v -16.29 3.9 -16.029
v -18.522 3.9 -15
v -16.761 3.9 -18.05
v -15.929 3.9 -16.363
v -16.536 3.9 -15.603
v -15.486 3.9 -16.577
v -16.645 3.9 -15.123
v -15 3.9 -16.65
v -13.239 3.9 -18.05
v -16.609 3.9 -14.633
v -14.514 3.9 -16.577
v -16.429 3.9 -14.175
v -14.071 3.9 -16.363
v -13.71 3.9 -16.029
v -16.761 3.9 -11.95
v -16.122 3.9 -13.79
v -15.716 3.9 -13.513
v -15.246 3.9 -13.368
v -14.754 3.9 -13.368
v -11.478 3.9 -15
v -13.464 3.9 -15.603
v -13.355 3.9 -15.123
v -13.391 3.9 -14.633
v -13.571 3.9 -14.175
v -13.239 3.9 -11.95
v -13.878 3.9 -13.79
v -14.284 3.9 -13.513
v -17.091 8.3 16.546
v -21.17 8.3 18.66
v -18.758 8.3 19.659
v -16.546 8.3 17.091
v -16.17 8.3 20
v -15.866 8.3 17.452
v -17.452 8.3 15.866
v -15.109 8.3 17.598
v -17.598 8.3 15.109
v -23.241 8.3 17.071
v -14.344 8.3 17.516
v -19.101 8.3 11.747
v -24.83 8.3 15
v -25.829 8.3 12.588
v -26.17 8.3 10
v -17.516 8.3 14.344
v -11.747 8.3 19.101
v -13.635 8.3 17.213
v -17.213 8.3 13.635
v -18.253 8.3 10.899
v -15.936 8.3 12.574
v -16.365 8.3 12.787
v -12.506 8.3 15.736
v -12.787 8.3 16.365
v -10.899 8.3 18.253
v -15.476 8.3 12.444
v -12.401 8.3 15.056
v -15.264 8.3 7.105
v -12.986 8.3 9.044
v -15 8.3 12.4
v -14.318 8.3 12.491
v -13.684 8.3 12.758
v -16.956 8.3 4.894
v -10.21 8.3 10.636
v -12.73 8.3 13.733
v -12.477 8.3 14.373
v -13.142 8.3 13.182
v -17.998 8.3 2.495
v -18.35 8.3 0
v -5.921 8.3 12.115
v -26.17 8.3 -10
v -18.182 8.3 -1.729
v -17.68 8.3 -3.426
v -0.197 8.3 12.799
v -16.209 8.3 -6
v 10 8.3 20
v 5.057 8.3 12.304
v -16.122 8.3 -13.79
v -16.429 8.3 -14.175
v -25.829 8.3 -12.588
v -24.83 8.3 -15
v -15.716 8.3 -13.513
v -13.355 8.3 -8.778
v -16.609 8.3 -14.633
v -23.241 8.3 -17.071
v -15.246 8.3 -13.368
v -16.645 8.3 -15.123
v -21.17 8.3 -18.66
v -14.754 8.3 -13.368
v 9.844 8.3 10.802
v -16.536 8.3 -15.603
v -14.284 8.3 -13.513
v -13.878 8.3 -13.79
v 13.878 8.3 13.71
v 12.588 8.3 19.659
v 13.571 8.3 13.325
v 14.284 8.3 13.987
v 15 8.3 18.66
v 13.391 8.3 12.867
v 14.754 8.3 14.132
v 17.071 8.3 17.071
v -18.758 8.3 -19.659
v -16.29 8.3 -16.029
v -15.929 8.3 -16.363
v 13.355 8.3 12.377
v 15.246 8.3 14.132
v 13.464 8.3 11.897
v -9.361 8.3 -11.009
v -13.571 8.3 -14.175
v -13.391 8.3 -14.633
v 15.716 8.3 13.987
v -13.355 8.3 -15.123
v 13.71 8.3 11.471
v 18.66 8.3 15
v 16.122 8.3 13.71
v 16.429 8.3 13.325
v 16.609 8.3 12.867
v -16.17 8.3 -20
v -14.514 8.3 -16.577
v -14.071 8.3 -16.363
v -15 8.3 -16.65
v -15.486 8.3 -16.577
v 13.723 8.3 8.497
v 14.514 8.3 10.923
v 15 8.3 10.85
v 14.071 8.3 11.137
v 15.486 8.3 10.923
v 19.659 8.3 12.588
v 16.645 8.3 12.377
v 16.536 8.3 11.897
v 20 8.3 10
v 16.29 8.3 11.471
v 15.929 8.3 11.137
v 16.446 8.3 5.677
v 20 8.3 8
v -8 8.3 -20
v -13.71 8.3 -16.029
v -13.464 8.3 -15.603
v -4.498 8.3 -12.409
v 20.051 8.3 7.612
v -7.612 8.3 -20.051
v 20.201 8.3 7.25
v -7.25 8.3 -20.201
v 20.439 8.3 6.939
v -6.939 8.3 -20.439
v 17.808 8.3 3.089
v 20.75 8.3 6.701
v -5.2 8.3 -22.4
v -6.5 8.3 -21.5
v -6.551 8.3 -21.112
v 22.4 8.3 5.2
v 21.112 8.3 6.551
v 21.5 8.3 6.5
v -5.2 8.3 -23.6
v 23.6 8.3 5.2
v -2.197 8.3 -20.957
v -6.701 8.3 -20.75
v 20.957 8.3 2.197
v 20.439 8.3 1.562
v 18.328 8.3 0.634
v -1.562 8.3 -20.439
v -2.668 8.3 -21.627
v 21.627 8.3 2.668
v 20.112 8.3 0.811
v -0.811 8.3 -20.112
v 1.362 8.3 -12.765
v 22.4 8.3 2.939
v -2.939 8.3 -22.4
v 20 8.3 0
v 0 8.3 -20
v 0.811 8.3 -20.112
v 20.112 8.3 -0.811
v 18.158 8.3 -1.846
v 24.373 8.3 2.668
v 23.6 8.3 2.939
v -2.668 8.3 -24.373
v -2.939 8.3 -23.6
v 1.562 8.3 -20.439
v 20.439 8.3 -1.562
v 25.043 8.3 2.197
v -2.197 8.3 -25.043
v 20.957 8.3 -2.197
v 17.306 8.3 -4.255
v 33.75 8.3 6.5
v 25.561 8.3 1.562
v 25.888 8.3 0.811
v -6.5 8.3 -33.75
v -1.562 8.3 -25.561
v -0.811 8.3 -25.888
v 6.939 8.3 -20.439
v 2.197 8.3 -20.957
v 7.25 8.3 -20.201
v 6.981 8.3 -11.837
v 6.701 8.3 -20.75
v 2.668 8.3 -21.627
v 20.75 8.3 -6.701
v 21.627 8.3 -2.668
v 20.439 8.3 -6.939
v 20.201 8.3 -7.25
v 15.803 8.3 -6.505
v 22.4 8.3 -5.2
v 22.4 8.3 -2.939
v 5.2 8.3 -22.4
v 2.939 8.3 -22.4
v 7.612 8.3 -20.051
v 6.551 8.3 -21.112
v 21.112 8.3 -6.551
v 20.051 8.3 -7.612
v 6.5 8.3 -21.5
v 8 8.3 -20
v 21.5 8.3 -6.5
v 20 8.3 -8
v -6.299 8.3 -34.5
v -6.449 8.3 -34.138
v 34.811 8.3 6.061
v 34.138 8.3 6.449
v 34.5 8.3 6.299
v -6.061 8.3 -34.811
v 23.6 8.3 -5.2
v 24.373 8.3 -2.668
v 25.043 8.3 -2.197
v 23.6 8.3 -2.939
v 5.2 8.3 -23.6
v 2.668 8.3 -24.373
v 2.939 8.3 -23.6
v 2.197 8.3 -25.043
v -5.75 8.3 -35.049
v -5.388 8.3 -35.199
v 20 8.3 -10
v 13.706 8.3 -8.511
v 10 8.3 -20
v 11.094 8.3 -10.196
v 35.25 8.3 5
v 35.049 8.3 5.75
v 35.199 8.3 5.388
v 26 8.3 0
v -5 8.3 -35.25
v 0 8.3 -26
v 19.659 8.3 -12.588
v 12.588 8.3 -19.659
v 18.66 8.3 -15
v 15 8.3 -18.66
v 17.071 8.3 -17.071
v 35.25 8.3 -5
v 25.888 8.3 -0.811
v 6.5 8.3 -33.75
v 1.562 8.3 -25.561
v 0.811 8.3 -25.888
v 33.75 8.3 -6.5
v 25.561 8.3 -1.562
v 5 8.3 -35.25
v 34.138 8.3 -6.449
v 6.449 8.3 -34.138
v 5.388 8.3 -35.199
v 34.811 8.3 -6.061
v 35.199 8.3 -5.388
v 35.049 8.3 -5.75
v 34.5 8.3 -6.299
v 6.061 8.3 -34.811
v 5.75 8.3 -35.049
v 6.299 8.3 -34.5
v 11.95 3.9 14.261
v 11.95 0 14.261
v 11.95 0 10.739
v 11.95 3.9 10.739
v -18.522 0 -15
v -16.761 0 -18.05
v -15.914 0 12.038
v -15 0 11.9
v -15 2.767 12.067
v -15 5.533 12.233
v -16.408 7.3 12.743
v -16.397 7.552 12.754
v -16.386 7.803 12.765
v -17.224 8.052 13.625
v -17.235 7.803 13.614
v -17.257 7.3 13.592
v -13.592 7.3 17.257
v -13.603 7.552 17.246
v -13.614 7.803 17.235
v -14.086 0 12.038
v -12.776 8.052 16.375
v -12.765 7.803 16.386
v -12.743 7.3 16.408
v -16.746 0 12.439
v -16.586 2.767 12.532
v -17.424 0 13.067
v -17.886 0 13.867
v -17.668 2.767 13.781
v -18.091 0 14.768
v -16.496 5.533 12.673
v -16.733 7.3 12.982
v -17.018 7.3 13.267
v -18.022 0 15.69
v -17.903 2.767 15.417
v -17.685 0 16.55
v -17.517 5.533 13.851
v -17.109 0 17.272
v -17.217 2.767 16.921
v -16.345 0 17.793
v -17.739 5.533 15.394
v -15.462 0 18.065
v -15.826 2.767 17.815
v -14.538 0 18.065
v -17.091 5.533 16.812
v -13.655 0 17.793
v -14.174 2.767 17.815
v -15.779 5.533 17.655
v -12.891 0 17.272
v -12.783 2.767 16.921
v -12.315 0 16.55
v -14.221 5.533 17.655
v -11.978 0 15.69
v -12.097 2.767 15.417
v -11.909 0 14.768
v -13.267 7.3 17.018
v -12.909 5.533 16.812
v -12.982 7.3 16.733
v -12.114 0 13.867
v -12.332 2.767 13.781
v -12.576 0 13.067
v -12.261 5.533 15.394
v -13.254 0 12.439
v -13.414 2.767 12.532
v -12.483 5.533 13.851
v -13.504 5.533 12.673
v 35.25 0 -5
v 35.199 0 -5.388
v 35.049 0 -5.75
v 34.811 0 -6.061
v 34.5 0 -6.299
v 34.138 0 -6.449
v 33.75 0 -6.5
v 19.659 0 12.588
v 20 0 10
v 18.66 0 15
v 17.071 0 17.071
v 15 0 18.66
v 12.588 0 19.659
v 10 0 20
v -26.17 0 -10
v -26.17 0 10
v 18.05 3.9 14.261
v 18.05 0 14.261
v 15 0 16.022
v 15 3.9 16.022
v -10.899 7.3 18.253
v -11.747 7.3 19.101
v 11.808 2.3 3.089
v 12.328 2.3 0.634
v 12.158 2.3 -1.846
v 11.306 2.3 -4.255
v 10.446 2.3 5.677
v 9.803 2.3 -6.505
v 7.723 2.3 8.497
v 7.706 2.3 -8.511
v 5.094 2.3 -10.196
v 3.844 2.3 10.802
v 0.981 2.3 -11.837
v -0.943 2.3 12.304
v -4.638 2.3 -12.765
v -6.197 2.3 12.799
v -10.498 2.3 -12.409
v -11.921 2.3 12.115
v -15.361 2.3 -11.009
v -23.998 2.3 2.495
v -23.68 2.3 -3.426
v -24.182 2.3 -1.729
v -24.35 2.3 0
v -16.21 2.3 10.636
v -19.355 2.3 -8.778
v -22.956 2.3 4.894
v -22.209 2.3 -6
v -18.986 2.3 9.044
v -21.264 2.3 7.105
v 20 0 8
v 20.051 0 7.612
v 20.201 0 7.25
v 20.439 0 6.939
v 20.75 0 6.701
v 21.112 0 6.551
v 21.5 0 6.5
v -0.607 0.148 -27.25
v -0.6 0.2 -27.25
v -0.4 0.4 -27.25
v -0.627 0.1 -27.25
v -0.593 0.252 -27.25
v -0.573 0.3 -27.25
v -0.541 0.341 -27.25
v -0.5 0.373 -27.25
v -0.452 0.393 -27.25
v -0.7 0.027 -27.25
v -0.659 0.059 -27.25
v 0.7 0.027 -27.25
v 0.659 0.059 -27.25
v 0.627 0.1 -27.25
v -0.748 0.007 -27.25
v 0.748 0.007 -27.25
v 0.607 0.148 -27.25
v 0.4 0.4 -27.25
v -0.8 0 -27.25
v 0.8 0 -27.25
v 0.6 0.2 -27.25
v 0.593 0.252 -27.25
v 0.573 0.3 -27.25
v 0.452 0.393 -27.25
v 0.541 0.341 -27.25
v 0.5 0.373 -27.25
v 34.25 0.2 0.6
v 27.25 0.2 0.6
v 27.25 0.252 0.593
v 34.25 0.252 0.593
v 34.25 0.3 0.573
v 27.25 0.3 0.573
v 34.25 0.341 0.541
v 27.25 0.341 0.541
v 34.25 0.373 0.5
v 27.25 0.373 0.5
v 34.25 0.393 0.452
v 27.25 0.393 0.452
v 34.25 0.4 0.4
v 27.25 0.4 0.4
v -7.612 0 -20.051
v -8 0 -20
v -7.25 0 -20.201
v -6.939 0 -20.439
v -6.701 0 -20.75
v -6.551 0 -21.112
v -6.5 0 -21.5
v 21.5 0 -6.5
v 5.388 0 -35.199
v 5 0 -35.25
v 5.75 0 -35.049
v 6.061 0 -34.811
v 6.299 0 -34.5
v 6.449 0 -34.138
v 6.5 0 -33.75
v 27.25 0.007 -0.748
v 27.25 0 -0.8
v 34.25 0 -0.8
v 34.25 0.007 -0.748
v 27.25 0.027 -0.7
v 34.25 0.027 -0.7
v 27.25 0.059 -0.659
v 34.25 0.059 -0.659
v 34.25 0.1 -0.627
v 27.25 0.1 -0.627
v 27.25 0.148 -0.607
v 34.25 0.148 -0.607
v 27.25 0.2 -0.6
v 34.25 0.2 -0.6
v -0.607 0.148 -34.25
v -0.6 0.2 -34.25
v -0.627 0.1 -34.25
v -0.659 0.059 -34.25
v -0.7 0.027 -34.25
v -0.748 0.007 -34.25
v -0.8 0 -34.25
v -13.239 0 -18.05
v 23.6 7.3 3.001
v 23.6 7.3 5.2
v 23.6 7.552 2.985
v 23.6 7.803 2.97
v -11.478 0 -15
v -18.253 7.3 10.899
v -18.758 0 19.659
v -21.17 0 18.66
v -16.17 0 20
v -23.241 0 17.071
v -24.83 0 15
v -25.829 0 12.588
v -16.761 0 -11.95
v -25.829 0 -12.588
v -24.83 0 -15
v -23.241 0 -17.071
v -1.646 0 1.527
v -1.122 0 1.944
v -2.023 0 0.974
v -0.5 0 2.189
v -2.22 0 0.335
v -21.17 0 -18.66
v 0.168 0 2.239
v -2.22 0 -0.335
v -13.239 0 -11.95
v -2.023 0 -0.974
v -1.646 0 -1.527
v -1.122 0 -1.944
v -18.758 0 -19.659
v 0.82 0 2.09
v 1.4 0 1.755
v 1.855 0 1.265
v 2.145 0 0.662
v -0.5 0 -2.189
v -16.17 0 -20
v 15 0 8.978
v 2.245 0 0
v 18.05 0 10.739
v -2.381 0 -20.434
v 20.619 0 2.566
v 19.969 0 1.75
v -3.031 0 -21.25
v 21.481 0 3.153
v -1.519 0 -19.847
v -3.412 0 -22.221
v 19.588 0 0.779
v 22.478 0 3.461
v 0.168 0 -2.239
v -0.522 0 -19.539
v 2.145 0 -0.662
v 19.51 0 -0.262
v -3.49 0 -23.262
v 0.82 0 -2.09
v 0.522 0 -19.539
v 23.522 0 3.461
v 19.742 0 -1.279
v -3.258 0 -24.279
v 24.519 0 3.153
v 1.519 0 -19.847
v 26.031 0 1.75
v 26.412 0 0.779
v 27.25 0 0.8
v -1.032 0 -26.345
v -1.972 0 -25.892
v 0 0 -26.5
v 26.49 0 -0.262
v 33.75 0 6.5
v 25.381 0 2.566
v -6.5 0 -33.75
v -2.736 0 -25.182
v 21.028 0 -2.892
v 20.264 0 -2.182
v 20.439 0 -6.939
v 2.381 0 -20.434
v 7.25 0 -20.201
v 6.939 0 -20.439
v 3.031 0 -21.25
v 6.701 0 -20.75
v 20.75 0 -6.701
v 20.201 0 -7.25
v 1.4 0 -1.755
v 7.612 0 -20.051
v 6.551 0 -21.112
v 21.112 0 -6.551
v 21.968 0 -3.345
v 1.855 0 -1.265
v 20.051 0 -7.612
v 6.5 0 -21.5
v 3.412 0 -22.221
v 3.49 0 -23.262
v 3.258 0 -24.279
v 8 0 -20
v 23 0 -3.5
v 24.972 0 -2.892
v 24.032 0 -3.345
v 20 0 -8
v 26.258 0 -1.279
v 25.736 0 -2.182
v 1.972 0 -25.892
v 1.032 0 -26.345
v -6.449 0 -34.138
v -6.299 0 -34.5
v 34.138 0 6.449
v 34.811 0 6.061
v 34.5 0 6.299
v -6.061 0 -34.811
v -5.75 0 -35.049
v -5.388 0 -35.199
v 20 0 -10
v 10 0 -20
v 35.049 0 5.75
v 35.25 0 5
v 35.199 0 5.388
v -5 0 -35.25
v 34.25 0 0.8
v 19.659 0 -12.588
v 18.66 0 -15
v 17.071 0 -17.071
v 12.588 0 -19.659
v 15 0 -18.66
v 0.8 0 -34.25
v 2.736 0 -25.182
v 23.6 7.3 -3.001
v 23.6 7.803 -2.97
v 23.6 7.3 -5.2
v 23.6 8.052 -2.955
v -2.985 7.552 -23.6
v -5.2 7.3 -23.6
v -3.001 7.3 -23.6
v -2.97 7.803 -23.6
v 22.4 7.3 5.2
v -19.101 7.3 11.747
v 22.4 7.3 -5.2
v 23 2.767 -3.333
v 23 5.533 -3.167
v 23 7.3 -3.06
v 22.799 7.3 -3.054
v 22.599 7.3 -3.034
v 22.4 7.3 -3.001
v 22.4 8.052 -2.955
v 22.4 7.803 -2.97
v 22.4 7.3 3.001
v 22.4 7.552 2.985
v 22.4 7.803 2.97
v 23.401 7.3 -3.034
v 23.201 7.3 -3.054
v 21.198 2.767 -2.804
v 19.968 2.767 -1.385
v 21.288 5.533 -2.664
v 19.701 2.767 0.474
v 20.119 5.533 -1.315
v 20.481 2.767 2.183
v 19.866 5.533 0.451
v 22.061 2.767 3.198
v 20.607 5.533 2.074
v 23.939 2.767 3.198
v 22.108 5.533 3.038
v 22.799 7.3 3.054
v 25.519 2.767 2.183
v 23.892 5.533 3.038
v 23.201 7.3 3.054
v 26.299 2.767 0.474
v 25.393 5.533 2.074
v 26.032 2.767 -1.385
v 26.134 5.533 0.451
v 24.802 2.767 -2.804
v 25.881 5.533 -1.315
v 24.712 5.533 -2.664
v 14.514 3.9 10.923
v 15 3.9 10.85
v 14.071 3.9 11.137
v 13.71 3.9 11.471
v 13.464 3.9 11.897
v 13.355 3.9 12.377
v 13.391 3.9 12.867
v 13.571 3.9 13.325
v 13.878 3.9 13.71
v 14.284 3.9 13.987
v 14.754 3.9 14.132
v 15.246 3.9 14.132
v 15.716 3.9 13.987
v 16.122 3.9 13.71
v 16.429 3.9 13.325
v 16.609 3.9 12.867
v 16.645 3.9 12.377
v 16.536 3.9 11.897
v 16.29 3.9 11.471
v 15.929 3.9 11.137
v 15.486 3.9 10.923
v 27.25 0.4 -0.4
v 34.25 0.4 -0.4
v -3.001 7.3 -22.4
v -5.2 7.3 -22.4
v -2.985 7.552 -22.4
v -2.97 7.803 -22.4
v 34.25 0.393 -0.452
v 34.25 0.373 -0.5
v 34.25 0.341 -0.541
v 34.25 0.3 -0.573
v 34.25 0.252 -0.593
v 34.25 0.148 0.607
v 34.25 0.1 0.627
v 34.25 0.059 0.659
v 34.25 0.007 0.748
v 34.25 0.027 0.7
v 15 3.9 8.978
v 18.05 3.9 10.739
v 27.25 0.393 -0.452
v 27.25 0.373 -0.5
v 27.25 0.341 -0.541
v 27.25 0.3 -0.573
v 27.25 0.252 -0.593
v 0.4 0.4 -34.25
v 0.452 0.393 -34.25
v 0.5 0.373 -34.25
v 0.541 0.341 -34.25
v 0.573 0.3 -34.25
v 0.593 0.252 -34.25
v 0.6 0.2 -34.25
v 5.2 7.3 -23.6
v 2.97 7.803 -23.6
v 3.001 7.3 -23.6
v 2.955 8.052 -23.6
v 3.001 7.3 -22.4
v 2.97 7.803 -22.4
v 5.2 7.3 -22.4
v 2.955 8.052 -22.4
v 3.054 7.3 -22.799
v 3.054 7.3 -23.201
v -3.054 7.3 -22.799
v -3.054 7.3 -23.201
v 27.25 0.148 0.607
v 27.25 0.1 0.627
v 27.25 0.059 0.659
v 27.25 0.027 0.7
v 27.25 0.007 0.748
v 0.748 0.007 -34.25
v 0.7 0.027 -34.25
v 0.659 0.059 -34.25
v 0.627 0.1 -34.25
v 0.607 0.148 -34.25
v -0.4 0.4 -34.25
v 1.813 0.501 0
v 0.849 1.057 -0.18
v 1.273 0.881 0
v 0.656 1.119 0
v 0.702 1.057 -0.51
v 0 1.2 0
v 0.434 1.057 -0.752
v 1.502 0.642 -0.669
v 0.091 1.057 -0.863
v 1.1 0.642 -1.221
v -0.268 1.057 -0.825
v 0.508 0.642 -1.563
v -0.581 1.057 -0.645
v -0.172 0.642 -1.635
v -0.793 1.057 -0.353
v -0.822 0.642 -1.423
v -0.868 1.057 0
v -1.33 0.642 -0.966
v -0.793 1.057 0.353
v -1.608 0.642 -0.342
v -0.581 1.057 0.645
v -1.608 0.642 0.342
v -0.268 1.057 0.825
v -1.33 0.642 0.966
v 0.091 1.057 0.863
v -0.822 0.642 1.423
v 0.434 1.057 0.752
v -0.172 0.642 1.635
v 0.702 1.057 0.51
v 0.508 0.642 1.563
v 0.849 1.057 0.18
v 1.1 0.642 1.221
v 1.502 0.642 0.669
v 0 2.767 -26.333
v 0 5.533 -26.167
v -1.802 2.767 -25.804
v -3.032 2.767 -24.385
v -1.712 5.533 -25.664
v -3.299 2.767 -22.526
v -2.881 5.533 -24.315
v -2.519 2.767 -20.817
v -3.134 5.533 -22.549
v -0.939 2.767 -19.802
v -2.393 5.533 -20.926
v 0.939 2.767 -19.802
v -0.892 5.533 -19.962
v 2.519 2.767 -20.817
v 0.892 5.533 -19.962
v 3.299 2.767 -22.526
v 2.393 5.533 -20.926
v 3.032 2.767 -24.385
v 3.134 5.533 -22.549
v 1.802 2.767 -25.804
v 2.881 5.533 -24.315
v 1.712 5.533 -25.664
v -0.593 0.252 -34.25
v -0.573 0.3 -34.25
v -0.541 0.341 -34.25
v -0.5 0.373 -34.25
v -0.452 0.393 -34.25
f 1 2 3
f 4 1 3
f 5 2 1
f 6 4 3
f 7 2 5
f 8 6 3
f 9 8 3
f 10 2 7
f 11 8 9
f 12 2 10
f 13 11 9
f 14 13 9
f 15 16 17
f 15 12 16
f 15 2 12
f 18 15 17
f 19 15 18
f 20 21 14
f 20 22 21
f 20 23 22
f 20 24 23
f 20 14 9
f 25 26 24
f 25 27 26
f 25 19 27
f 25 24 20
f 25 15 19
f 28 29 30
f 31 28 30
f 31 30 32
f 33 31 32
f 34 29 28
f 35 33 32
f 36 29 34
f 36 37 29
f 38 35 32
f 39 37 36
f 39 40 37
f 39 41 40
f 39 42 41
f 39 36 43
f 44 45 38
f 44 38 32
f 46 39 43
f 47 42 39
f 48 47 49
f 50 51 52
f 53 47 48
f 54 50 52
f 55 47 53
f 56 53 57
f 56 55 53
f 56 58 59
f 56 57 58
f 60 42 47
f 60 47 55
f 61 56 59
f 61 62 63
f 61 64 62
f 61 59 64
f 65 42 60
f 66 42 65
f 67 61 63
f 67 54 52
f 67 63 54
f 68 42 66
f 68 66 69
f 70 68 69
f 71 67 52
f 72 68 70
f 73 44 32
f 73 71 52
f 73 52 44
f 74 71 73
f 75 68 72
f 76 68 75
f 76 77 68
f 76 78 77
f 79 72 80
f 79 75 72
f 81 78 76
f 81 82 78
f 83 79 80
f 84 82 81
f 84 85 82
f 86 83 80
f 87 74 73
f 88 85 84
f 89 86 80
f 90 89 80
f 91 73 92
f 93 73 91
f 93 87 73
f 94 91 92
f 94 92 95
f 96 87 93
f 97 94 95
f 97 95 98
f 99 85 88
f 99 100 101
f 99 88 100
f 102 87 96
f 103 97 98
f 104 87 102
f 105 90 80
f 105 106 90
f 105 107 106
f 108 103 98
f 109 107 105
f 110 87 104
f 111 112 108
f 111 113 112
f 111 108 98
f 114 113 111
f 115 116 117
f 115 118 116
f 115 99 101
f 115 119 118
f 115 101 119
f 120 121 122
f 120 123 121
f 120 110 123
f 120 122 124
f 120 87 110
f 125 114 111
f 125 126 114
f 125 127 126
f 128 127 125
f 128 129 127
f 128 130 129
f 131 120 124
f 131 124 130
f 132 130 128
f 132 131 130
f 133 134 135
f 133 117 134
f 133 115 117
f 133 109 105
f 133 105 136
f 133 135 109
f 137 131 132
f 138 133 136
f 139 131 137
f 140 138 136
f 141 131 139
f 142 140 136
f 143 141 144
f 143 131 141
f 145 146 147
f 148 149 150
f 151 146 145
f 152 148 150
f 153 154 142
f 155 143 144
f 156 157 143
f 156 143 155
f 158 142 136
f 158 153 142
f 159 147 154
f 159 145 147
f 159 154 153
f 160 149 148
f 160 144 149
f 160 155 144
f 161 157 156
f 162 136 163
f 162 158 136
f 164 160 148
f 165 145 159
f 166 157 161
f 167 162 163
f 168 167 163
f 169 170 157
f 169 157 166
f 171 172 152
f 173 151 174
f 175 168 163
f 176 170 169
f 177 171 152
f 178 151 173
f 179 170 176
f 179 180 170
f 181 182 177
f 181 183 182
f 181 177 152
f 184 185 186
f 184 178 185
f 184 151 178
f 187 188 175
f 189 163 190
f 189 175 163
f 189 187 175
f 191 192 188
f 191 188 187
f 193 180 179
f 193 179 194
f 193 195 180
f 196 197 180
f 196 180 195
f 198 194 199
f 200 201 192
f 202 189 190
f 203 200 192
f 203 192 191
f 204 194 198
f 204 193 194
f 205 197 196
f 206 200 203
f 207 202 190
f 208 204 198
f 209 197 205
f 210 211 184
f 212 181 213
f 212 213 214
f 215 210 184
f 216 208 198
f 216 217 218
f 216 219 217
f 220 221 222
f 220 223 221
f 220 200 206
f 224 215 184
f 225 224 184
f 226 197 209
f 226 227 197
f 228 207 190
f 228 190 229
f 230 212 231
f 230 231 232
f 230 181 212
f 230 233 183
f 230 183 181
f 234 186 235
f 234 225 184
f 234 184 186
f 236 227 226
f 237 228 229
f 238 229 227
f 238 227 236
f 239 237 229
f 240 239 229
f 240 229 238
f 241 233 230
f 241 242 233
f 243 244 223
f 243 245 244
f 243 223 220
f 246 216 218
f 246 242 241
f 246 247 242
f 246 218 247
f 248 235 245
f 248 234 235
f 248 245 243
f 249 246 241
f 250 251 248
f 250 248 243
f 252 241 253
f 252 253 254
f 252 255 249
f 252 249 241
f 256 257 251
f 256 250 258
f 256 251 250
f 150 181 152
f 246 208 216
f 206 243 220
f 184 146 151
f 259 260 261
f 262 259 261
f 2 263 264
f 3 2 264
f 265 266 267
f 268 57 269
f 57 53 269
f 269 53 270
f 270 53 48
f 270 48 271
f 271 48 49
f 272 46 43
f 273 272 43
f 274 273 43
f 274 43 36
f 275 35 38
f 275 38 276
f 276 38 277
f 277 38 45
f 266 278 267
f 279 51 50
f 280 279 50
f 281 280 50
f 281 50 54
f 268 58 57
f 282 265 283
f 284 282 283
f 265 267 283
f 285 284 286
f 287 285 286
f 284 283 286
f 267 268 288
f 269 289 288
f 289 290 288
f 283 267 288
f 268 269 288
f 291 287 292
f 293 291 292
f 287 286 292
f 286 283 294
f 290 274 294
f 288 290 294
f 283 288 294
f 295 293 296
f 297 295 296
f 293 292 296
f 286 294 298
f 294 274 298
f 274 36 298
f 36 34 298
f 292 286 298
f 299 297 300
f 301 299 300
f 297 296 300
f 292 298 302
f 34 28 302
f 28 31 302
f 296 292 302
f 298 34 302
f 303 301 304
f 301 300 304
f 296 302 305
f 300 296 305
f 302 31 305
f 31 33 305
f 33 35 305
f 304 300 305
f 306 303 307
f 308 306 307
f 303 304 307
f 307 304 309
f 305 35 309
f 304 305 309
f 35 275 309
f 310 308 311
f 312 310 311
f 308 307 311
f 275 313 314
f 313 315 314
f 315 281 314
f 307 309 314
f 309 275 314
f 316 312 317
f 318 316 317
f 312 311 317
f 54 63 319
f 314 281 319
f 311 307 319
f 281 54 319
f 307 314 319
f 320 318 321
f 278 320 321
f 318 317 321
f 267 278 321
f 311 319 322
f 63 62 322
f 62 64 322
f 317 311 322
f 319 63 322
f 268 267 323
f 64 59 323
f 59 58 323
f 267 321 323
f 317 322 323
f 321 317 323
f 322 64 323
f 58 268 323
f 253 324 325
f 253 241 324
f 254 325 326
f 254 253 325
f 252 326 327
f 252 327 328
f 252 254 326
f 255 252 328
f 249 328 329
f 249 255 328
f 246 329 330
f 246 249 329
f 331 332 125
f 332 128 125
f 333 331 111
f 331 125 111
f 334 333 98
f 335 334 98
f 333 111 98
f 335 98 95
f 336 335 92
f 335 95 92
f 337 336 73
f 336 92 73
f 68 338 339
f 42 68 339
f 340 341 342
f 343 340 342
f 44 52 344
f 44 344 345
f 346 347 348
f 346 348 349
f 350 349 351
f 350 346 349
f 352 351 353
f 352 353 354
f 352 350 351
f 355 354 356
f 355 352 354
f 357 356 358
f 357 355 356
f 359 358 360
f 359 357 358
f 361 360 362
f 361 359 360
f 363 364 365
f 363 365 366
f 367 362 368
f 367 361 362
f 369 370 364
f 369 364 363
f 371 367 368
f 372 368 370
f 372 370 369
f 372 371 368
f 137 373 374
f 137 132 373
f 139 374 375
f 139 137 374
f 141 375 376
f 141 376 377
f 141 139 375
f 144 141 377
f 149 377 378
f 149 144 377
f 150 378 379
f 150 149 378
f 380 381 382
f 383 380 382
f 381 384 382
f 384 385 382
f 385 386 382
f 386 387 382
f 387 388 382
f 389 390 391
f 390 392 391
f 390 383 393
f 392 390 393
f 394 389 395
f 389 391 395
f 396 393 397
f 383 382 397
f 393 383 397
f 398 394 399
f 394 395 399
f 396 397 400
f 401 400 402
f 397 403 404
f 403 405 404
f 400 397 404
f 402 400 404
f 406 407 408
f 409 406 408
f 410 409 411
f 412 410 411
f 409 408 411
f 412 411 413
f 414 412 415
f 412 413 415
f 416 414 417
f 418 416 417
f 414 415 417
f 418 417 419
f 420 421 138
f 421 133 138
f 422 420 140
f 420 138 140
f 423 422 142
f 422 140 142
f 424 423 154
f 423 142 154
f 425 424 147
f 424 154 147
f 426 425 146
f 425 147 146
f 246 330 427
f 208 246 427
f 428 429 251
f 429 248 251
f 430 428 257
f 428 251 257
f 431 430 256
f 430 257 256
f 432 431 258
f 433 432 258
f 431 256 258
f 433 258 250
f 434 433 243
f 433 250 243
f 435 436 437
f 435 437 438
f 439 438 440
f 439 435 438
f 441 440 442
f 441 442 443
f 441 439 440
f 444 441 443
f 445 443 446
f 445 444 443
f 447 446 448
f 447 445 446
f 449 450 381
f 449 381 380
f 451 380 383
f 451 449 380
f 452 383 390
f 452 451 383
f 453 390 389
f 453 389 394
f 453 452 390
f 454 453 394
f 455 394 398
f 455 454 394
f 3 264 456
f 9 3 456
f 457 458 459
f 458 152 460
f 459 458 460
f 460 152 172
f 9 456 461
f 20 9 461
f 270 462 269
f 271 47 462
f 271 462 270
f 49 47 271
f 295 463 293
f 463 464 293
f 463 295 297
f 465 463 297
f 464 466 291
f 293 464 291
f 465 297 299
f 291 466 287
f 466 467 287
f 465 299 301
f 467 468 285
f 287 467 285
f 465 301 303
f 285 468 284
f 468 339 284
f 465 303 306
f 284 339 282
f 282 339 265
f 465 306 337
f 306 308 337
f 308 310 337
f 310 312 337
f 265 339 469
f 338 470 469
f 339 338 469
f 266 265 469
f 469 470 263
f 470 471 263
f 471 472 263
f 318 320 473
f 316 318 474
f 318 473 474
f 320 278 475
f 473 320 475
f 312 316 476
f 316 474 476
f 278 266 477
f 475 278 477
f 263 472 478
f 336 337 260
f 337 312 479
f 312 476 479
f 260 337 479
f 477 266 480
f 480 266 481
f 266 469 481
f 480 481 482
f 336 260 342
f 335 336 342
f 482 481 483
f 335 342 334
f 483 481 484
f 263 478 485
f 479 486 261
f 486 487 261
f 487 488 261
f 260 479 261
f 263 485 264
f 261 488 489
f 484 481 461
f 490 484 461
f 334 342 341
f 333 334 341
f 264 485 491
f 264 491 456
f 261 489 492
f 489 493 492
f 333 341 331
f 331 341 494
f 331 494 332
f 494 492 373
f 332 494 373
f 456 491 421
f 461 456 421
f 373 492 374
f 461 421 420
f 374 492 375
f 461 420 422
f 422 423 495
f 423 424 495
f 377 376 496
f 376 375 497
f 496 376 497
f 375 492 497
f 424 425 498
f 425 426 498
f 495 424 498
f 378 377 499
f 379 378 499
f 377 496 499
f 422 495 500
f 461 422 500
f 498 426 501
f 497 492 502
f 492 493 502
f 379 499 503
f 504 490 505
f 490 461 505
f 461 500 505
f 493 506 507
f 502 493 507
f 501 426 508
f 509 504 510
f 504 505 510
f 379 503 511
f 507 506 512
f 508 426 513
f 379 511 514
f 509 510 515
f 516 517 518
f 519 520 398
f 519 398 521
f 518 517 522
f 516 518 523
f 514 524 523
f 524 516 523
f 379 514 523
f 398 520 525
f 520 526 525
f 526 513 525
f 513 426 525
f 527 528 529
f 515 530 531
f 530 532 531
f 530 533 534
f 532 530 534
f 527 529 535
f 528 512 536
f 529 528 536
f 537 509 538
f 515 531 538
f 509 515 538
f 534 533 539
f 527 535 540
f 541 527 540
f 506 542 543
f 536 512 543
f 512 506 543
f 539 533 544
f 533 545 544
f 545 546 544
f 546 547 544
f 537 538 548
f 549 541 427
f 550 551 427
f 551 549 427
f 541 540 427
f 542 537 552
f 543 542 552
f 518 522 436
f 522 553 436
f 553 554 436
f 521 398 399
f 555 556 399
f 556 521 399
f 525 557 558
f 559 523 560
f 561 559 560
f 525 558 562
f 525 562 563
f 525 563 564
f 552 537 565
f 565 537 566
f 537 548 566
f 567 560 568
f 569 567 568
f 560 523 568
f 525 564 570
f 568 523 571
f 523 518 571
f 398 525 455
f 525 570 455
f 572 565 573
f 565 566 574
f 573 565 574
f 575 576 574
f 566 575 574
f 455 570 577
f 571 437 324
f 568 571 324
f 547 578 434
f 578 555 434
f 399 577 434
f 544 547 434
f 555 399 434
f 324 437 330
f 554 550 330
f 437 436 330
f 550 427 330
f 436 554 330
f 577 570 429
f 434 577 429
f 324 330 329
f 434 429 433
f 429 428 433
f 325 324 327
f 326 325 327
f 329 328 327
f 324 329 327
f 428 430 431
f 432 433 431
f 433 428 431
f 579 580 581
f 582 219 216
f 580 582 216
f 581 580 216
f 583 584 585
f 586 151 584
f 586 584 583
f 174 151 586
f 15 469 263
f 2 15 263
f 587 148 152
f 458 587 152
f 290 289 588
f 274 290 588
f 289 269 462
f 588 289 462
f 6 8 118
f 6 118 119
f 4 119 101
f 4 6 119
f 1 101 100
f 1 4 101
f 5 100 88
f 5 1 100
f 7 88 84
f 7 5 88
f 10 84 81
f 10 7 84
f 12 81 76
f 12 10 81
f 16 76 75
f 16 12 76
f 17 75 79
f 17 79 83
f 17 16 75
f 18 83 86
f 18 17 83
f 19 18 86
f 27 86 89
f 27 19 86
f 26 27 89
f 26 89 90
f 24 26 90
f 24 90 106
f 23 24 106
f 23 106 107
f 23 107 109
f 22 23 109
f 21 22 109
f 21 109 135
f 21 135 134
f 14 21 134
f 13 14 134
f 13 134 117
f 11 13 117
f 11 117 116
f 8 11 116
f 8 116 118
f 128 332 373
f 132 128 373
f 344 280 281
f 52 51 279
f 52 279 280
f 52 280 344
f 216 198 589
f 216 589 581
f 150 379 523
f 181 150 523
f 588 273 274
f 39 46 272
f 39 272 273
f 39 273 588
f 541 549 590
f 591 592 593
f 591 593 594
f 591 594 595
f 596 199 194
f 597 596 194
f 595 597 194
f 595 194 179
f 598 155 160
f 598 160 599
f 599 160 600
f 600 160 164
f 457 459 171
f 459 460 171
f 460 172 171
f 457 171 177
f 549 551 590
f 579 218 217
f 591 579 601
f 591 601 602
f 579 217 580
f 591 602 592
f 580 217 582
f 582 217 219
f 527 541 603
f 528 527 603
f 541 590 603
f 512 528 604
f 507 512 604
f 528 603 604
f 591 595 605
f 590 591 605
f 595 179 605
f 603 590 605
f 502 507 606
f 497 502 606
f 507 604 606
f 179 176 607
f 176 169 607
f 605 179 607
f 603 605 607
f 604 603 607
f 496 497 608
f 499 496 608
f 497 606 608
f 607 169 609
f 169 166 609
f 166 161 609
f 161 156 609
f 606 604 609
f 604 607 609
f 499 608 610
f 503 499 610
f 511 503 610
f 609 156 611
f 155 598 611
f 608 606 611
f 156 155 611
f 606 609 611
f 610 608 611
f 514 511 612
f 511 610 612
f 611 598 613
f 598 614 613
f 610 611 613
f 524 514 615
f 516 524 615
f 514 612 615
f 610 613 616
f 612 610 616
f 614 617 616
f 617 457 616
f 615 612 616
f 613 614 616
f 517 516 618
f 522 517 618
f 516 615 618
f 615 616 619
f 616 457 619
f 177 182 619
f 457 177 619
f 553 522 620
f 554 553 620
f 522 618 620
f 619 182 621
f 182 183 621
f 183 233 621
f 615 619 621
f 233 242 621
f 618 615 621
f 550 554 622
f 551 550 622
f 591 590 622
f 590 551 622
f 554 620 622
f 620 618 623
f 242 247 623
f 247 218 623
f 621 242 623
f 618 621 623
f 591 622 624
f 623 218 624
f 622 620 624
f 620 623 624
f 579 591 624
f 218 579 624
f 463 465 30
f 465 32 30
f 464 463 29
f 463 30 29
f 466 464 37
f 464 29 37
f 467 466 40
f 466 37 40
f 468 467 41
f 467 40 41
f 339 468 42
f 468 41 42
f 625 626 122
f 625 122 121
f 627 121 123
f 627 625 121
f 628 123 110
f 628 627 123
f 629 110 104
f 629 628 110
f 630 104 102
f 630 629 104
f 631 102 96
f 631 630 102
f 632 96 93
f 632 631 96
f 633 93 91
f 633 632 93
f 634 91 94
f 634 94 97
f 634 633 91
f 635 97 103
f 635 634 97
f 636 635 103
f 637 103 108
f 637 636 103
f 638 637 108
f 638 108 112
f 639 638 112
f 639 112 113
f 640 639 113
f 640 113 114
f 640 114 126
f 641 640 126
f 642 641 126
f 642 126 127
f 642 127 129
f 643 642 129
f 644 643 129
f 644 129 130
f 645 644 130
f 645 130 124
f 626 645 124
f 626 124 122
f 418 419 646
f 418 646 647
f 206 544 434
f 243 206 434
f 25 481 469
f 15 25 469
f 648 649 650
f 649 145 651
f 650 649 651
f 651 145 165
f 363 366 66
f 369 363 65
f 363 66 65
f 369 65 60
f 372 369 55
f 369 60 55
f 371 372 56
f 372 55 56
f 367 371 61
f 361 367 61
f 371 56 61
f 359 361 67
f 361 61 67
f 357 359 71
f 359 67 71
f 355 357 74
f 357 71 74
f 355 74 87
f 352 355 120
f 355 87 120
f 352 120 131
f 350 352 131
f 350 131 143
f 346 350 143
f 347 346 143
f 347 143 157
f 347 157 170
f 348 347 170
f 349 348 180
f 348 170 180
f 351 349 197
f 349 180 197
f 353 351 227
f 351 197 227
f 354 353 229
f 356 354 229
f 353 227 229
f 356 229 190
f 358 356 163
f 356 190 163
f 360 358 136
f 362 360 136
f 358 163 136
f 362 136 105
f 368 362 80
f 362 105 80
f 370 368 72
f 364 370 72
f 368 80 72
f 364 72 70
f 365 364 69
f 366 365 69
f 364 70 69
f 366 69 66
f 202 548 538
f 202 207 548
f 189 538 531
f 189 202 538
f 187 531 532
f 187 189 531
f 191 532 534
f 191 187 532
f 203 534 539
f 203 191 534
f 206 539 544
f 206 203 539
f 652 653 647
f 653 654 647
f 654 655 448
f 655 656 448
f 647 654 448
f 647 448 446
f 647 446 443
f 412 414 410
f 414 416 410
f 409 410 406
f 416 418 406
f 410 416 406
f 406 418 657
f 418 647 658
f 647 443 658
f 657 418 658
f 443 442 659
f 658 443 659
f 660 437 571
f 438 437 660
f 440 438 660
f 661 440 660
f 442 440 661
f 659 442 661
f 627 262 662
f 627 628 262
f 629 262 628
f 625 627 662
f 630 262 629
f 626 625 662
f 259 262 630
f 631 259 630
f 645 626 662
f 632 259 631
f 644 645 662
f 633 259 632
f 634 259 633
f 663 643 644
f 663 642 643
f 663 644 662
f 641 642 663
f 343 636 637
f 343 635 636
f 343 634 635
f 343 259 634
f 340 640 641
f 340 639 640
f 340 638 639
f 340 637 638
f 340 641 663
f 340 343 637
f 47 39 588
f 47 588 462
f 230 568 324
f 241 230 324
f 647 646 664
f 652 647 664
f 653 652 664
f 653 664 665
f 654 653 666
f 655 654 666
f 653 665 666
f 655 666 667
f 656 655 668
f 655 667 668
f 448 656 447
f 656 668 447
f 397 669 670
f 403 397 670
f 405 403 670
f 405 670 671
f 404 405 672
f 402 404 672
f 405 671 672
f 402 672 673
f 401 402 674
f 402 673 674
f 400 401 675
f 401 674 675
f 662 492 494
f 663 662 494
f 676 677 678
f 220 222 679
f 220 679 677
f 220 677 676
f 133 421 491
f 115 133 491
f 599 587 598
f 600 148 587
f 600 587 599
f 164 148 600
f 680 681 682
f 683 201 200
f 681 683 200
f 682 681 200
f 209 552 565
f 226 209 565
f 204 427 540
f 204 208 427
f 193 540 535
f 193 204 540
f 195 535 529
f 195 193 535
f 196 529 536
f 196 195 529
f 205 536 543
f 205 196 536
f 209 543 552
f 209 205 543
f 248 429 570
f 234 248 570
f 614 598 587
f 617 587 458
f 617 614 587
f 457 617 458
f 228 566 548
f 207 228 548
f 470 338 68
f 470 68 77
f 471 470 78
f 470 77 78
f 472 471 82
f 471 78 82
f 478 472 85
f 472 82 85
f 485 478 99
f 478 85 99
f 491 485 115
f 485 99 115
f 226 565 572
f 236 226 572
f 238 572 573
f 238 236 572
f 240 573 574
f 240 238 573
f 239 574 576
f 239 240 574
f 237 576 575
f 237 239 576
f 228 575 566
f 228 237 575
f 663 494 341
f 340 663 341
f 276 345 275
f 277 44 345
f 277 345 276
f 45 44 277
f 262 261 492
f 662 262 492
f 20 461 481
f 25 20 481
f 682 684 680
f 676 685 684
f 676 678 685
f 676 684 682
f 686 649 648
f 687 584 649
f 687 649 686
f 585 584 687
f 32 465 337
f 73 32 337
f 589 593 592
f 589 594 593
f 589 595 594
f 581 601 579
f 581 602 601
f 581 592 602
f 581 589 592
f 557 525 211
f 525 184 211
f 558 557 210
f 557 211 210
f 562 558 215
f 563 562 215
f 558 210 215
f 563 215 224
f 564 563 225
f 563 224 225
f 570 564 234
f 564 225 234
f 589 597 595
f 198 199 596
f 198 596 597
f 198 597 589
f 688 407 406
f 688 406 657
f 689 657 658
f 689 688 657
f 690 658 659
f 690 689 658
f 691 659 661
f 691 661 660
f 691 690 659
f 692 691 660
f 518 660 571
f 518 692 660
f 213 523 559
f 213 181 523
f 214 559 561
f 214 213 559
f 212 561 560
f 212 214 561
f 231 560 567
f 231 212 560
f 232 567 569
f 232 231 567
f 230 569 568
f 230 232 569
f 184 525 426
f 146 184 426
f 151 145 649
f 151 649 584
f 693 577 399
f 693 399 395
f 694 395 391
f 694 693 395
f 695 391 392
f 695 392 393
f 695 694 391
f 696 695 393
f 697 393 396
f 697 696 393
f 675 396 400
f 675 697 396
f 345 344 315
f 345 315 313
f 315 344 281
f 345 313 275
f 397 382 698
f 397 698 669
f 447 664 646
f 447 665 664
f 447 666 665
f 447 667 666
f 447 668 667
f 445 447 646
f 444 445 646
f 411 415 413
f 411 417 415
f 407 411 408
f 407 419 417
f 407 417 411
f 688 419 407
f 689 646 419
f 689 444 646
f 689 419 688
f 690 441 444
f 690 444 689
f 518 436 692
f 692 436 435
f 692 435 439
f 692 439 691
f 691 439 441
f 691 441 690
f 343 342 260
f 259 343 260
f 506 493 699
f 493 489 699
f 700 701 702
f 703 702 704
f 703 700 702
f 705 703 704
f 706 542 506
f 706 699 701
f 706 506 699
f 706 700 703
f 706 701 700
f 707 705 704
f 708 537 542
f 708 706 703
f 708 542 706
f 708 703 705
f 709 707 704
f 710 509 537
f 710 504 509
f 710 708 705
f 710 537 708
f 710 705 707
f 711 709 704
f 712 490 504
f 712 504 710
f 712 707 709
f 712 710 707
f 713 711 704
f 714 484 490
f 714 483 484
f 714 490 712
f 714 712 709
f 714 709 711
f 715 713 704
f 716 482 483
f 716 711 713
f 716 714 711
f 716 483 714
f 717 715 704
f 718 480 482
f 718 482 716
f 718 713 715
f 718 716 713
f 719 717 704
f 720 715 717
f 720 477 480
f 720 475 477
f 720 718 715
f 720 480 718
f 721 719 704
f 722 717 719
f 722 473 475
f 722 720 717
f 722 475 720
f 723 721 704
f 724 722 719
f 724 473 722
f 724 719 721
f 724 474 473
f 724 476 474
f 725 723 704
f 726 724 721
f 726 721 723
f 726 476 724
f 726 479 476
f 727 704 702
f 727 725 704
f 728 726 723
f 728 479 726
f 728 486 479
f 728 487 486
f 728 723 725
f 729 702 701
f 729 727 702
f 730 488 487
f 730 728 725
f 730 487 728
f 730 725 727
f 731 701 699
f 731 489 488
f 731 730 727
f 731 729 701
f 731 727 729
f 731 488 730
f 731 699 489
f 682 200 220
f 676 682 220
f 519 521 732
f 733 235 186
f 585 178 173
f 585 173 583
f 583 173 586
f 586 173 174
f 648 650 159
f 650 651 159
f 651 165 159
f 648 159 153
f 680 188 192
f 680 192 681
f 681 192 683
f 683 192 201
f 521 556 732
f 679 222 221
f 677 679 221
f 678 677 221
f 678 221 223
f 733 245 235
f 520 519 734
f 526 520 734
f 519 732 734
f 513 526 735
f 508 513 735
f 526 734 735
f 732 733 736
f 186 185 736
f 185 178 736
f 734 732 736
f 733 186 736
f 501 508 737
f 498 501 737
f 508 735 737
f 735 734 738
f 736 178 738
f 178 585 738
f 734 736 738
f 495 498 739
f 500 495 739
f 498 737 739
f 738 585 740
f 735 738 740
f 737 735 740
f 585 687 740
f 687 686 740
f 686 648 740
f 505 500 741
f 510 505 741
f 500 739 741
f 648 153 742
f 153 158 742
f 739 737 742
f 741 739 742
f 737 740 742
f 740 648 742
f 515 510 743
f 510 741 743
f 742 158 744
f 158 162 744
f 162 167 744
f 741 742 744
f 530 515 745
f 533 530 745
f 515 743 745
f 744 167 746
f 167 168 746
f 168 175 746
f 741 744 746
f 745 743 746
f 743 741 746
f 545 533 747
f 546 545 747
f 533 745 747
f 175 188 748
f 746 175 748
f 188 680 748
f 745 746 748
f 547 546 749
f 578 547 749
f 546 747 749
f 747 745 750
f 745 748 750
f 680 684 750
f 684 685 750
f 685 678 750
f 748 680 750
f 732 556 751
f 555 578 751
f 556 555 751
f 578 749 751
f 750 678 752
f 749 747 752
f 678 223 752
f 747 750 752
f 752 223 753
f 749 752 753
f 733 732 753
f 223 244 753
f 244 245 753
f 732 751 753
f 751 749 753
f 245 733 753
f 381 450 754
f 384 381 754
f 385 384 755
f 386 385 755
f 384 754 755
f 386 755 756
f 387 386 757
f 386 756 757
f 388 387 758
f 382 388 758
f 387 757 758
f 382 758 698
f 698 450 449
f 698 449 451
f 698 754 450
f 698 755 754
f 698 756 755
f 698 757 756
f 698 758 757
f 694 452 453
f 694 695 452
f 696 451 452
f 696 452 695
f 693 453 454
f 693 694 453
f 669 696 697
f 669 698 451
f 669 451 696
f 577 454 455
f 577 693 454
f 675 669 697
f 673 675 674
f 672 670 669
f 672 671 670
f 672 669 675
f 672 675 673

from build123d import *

# Parameters (mm, degrees)
SKETCH2_R           = 3
SKETCH2_R_2         = 2.6
SKETCH2_R_3         = 1.65
BOSS_EXTRUDE1_DEPTH = 8.3
SKETCH19_RX         = 18.35
SKETCH19_RY         = 12.8
CUT_EXTRUDE4_DEPTH  = 8.485281374
FILLET1_R           = 1.5
FILLET2_R           = 10
SKETCH14_W          = 1.2
SKETCH14_H          = 10.4
SKETCH14_W_2        = 10.4
SKETCH14_H_2        = 1.2
CUT_EXTRUDE2_DEPTH  = 1
CUT_EXTRUDE3_DEPTH  = 3.9
CHAMFER1_SIZE       = 0.5
CHAMFER1_SIZE_2     = 8.3
SKETCH20_W          = 7
SKETCH20_H          = 1.2
SKETCH20_W_2        = 1.2
SKETCH20_H_2        = 7
CUT_EXTRUDE5_DEPTH  = 0.4
FILLET3_START       = -35
FILLET3_DEPTH       = 7.75
FILLET3_START_2     = 27.25
FILLET3_2_DEPTH     = 7.75
FILLET3_START_3     = -34.25
FILLET3_3_DEPTH     = 7
FILLET3_4_DEPTH     = 7


with BuildPart() as part:
    # Sketch2 → Boss-Extrude1 (new body)
    with BuildSketch(Plane(origin=(0, 0, 0), x_dir=(1, 0, 0), z_dir=(0, 1, 0))):
        Polygon((20, -20), (20, -6.5), (35.25, -6.5), (35.25, 6.5), (20, 6.5), (20, 20), (6.5, 20), (6.5, 35.25), (-6.5, 35.25), (-6.5, 20), (-26.17, 20), (-26.17, -20), align=None)
        with Locations(Location((23, 0, 0), (0, 0, 90))):
            Circle(SKETCH2_R, mode=Mode.SUBTRACT)
        with Locations(Location((0, 23, 0), (0, 0, 90))):
            Circle(SKETCH2_R, mode=Mode.SUBTRACT)
        with Locations(Location((-15, -15, 0), (0, 0, 90))):
            Circle(SKETCH2_R_2, mode=Mode.SUBTRACT)
        with Locations(Location((-15, 15, 0), (0, 0, 90))):
            Circle(SKETCH2_R_3, mode=Mode.SUBTRACT)
        with Locations(Location((15, -12.5, 0), (0, 0, 90))):
            Circle(SKETCH2_R_3, mode=Mode.SUBTRACT)
    extrude(amount=BOSS_EXTRUDE1_DEPTH)

    # Sketch19 → Cut-Extrude4 (cut, along a direction that is not the sketch's normal)
    with BuildSketch(Plane(origin=(11.72685066, 8.3, 0), x_dir=(0, 0, -1), z_dir=(0, 1, 0))):
        with Locations(Location((0, 11.72685066), (0, 0, 90))):
            Ellipse(SKETCH19_RX, SKETCH19_RY)
    extrude(amount=-CUT_EXTRUDE4_DEPTH, dir=(0.7071067811865488, 0.7071067811865464, 0), mode=Mode.SUBTRACT)

    # Fillet1
    fillet1_edges = [part.edges().sort_by_distance(p)[0] for p in [
        (-6.5, 4.15, -20),
        (-6.5, 4.15, -35.25),
        (6.5, 4.15, -35.25),
        (6.5, 4.15, -20),
        (20, 4.15, -6.5),
        (35.25, 4.15, -6.5),
        (35.25, 4.15, 6.5),
        (20, 4.15, 6.5),
    ]]
    fillet(fillet1_edges, radius=FILLET1_R)

    # Fillet2
    fillet2_edges = [part.edges().sort_by_distance(p)[0] for p in [
        (-26.17, 4.15, 20),
        (-26.17, 4.15, -20),
        (20, 4.15, -20),
        (20, 4.15, 20),
    ]]
    fillet(fillet2_edges, radius=FILLET2_R)

    # Sketch15 → Cut-Revolve1 (revolve, cut)
    with BuildSketch(Plane.XY):
        with BuildLine():
            Line((0, 0), (0, 1.2))
            ThreePointArc((0, 1.2), (1.272792206, 0.88117618), (2.244994432, 0))
            Line((2.244994432, 0), (0, 0))
        make_face()
    revolve(axis=Axis((0, 0, 0), (0, 1, 0)), mode=Mode.SUBTRACT)

    # Sketch14 → Cut-Extrude2 (cut)
    with BuildSketch(Plane(origin=(0, 8.3, 0), x_dir=(1, 0, 0), z_dir=(0, 1, 0))):
        with Locations((23, 0)):
            Rectangle(SKETCH14_W, SKETCH14_H)
        with Locations((0, 23)):
            Rectangle(SKETCH14_W_2, SKETCH14_H_2)
        Polygon((-18.252691193, -10.898780669), (-10.898780669, -18.252691193), (-11.747308807, -19.101219331), (-19.101219331, -11.747308807), align=None)
    extrude(amount=-CUT_EXTRUDE2_DEPTH, mode=Mode.SUBTRACT)

    # Sketch16 → Cut-Extrude3 (cut)
    with BuildSketch(Plane.XZ):
        Polygon((-13.239081679, -11.95), (-16.760918321, -11.95), (-18.521836642, -15), (-16.760918321, -18.05), (-13.239081679, -18.05), (-11.478163358, -15), align=None)
        Polygon((18.05, 14.260918321), (15, 16.021836642), (11.95, 14.260918321), (11.95, 10.739081679), (15, 8.978163358), (18.05, 10.739081679), align=None)
    extrude(amount=-CUT_EXTRUDE3_DEPTH, mode=Mode.SUBTRACT)

    # Chamfer1
    # the kernel refuses this chamfer: 8.3, 0.5 mm, written as the material it takes off along each edge
    with BuildSketch(Plane(origin=(0, 0, -23), x_dir=(0, 0, -1), z_dir=(1, 0, 0))) as chamfer1_piece_1:
        Polygon((3 + CHAMFER1_SIZE, 0), (3, CHAMFER1_SIZE_2), (3, 0), align=None)
    revolve(axis=Axis((0, 0, -23), (0, 1, 0)), mode=Mode.SUBTRACT)
    with BuildSketch(Plane(origin=(23, 0, 0), x_dir=(0, 0, -1), z_dir=(1, 0, 0))) as chamfer1_piece_2:
        Polygon((3 + CHAMFER1_SIZE, 0), (3, CHAMFER1_SIZE_2), (3, 0), align=None)
    revolve(axis=Axis((23, 0, 0), (0, 1, 0)), mode=Mode.SUBTRACT)
    with BuildSketch(Plane(origin=(-15, 0, 15), x_dir=(0, 0, -1), z_dir=(1, 0, 0))) as chamfer1_piece_3:
        Polygon((2.6 + CHAMFER1_SIZE, 0), (2.6, CHAMFER1_SIZE_2), (2.6, 0), align=None)
    revolve(axis=Axis((-15, 0, 15), (0, 1, 0)), mode=Mode.SUBTRACT)

    # Sketch20 → Cut-Extrude5 (cut)
    with BuildSketch(Plane.XZ):
        with Locations((30.75, 0)):
            Rectangle(SKETCH20_W, SKETCH20_H)
        with Locations((0, -30.75)):
            Rectangle(SKETCH20_W_2, SKETCH20_H_2)
    extrude(amount=-CUT_EXTRUDE5_DEPTH, mode=Mode.SUBTRACT)

    # Fillet3: read off the stored shape, not the designer's step
    # Fillet3 outline → Fillet3 (add)
    with BuildSketch(Plane.XY.offset(FILLET3_START)):
        with BuildLine():
            ThreePointArc((-0.6, 0.2), (-0.541421356, 0.341421356), (-0.4, 0.4))
            Line((-0.4, 0.4), (-0.6, 0.4))
            Line((-0.6, 0.4), (-0.6, 0.2))
        make_face()
        with BuildLine():
            Line((0.6, 0.4), (0.4, 0.4))
            ThreePointArc((0.4, 0.4), (0.541421356, 0.341421356), (0.6, 0.2))
            Line((0.6, 0.2), (0.6, 0.4))
        make_face()
    extrude(amount=FILLET3_DEPTH)

    # Fillet3 2 outline → Fillet3 2 (add)
    with BuildSketch(Plane.YZ.offset(FILLET3_START_2)):
        with BuildLine():
            Line((0.4, -0.6), (0.4, -0.4))
            ThreePointArc((0.4, -0.4), (0.341421356, -0.541421356), (0.2, -0.6))
            Line((0.2, -0.6), (0.4, -0.6))
        make_face()
        with BuildLine():
            ThreePointArc((0.2, 0.6), (0.341421356, 0.541421356), (0.4, 0.4))
            Line((0.4, 0.4), (0.4, 0.6))
            Line((0.4, 0.6), (0.2, 0.6))
        make_face()
    extrude(amount=FILLET3_2_DEPTH)

    # Fillet3 3 outline → Fillet3 3 (cut)
    with BuildSketch(Plane.XY.offset(FILLET3_START_3)):
        with BuildLine():
            Line((-0.6, 0), (-0.6, 0.2))
            ThreePointArc((-0.6, 0.2), (-0.658578644, 0.058578644), (-0.8, 0))
            Line((-0.8, 0), (-0.6, 0))
        make_face()
        with BuildLine():
            ThreePointArc((0.8, 0), (0.658578644, 0.058578644), (0.6, 0.2))
            Line((0.6, 0.2), (0.6, 0))
            Line((0.6, 0), (0.8, 0))
        make_face()
    extrude(amount=FILLET3_3_DEPTH, mode=Mode.SUBTRACT)

    # Fillet3 4 outline → Fillet3 4 (cut)
    with BuildSketch(Plane.YZ.offset(FILLET3_START_2)):
        with BuildLine():
            ThreePointArc((0, -0.8), (0.058578644, -0.658578644), (0.2, -0.6))
            Line((0.2, -0.6), (0, -0.6))
            Line((0, -0.6), (0, -0.8))
        make_face()
        with BuildLine():
            Line((0, 0.6), (0.2, 0.6))
            ThreePointArc((0.2, 0.6), (0.058578644, 0.658578644), (0, 0.8))
            Line((0, 0.8), (0, 0.6))
        make_face()
    extrude(amount=FILLET3_4_DEPTH, mode=Mode.SUBTRACT)


solid = part.part
